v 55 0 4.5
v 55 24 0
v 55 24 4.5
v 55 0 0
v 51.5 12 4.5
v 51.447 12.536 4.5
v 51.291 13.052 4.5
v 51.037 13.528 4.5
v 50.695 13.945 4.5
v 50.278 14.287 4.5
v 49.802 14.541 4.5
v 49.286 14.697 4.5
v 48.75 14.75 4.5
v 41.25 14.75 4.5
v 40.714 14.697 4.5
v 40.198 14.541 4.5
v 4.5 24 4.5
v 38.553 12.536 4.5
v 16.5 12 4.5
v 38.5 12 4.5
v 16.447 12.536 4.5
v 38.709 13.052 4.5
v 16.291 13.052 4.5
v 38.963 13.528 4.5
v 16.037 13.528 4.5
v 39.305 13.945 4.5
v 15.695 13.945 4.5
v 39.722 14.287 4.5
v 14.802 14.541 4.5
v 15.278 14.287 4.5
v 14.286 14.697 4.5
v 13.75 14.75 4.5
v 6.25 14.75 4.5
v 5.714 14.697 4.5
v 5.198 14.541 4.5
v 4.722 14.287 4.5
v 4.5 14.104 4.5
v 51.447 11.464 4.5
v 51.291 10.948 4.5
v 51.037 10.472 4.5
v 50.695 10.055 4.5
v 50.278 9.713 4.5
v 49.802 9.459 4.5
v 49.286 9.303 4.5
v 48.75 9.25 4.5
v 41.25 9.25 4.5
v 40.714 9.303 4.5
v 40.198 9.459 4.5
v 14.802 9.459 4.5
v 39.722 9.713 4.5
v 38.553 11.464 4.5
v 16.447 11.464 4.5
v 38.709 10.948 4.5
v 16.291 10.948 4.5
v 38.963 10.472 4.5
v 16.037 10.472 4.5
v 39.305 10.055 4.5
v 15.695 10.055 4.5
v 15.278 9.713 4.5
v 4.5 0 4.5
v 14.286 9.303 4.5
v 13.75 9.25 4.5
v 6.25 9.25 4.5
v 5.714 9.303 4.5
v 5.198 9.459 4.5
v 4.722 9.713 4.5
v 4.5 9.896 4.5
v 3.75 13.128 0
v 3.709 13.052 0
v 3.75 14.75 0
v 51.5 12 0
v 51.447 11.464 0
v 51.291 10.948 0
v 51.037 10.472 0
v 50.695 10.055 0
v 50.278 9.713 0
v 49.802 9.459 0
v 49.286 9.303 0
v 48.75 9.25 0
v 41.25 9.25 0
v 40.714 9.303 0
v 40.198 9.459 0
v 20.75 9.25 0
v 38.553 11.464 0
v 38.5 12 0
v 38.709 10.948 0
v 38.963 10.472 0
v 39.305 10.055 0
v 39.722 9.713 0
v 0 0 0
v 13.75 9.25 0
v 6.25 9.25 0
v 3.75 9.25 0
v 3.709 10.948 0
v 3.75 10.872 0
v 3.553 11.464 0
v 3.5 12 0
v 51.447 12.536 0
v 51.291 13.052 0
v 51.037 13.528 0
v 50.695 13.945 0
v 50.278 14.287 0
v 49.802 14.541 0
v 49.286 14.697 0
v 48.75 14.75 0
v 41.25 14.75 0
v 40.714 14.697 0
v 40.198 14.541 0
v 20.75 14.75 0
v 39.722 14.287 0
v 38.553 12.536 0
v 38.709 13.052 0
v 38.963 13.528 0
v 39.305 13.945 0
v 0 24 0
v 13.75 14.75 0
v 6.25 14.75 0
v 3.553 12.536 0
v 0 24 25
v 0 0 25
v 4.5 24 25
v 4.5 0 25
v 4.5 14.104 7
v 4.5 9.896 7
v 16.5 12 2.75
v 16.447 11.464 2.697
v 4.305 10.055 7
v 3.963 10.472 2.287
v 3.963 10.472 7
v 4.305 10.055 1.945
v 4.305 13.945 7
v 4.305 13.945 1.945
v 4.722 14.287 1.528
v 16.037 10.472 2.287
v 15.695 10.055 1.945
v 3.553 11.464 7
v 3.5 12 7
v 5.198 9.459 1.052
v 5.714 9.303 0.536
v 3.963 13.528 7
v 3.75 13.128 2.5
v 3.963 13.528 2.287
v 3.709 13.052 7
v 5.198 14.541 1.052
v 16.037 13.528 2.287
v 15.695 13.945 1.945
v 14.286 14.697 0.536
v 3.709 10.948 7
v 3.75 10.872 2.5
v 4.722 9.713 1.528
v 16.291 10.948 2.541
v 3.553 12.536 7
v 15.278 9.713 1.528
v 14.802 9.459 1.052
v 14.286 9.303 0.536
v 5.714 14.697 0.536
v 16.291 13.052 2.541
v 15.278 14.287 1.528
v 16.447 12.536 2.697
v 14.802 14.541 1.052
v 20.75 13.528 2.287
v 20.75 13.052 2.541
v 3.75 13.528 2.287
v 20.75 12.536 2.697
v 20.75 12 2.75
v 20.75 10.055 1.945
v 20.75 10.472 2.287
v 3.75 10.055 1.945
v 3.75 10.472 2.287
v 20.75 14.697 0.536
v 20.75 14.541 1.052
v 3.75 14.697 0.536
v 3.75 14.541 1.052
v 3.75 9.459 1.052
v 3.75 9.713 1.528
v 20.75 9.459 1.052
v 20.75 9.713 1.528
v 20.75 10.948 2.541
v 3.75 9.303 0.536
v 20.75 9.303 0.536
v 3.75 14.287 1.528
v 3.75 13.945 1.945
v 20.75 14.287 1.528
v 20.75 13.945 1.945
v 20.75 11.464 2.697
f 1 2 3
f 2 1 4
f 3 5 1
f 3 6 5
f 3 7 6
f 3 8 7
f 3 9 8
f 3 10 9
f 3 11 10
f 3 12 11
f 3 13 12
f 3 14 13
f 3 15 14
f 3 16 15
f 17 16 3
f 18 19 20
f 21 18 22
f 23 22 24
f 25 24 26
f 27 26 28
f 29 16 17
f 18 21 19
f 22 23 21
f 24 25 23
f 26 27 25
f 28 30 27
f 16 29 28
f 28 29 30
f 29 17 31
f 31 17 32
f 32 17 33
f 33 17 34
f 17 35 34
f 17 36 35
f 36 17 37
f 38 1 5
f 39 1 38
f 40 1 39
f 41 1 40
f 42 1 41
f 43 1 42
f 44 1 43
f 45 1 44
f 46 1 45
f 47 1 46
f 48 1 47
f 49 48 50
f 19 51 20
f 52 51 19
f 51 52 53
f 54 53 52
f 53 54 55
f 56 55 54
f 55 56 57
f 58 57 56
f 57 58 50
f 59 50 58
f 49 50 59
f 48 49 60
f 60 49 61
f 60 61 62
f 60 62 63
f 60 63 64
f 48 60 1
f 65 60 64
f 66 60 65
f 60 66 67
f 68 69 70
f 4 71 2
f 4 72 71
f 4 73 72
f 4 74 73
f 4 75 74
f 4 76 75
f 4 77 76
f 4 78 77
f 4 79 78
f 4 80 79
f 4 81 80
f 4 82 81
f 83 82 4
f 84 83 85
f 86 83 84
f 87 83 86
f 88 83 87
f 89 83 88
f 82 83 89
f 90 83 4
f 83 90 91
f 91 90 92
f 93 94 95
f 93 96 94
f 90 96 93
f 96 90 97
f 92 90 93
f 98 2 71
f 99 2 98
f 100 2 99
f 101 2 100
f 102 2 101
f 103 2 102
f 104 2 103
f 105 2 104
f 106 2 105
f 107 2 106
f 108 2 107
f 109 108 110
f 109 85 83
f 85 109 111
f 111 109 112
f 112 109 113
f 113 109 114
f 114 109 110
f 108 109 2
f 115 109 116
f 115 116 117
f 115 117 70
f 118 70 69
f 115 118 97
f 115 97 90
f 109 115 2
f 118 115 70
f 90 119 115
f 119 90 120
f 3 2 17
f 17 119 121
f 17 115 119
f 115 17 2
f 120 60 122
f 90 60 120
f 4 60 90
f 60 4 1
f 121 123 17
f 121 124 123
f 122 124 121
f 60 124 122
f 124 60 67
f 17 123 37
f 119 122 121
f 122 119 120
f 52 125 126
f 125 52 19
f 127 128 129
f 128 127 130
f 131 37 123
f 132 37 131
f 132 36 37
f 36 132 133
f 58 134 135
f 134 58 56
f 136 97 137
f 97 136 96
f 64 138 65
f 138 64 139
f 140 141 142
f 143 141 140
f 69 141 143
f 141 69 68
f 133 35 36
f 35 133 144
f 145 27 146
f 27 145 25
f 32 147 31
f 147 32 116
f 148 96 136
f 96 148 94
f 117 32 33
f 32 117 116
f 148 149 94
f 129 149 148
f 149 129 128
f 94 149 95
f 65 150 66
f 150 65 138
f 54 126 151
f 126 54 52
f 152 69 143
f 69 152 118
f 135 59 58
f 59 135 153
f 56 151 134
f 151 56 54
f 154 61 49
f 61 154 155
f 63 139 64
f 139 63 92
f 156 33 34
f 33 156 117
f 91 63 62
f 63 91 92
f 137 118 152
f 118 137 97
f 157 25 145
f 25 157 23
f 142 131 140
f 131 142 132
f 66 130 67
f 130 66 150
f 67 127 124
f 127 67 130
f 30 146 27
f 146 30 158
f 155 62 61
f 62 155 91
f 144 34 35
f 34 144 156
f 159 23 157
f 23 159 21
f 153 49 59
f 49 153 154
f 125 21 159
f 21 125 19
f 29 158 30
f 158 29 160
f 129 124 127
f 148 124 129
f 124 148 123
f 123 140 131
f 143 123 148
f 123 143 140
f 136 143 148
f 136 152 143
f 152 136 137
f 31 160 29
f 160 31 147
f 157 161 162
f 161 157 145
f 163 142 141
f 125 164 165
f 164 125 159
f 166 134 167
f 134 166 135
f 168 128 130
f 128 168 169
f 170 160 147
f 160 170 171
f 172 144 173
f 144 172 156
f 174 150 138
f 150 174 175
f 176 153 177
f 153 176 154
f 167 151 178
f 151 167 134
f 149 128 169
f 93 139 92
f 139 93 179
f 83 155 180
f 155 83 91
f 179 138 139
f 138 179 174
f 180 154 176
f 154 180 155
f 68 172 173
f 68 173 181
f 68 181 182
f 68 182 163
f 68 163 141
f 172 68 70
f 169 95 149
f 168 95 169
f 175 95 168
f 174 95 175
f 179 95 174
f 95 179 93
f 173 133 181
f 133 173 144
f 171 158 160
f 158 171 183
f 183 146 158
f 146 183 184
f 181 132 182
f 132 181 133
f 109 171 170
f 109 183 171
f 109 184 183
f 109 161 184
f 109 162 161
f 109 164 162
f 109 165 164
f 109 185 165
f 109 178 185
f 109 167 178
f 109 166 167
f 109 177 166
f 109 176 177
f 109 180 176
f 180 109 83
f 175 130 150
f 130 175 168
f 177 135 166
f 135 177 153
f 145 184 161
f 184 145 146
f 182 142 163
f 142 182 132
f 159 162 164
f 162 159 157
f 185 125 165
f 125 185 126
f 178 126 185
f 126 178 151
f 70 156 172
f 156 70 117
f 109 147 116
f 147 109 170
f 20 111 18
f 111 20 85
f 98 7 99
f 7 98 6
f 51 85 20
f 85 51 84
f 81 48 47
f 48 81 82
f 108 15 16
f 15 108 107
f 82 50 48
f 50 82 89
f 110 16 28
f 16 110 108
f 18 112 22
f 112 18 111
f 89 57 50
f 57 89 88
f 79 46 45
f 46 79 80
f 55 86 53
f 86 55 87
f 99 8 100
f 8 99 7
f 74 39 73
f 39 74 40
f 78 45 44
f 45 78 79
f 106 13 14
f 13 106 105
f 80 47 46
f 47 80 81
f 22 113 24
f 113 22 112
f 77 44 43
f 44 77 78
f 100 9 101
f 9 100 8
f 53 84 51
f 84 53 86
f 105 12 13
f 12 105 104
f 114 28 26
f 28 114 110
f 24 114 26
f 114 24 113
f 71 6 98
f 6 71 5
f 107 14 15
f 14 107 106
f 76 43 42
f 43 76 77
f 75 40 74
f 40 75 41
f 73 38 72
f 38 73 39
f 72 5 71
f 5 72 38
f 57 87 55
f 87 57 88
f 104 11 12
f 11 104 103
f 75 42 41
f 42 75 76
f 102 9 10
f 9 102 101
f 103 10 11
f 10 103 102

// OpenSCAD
$fn = 32;

// ----------------------------------------------------------------------
// L-bracket: 55 x 24 x 25 mm
// ----------------------------------------------------------------------

// --- parameters (mm) ---
arm_x = 55;               // horizontal leg, X
arm_z = 25;               // vertical leg, Z
width = 24;               // bracket depth, Y
wall = 4.5;               // plate thickness
hole_d = 4.5;             // clearance for M4
slot_w = 5.5;             // euro screw slot width
slot_l = 13;              // euro screw slot length

module hole_z(px, py) {
  translate([px, py, -2.5]) cylinder(h = wall + 5, d = hole_d);
}
module hole_x(pz, py) {
  translate([-2.5, py, pz]) rotate([0, 90, 0]) cylinder(h = wall + 5, d = hole_d);
}
module euro_slot_z(px, py) {
  hull() {
    translate([px - (slot_l - slot_w) / 2, py, -2.5]) cylinder(h = wall + 5, d = slot_w);
    translate([px + (slot_l - slot_w) / 2, py, -2.5]) cylinder(h = wall + 5, d = slot_w);
  }
}
module euro_slot_x(pz, py) {
  translate([-2.5, 0, 0]) rotate([0, 90, 0]) hull() {
    translate([0, py, pz - (slot_l - slot_w) / 2]) cylinder(h = wall + 5, d = slot_w);
    translate([0, py, pz + (slot_l - slot_w) / 2]) cylinder(h = wall + 5, d = slot_w);
  }
}

difference() {
  union() {
    /* horizontal leg */
    cube([arm_x, width, wall]);
    /* vertical leg, overlapping the corner block */
    cube([wall, width, arm_z]);
  }
  euro_slot_z(10, 12);
  euro_slot_x(10, 12);
  euro_slot_z(45, 12);
}
